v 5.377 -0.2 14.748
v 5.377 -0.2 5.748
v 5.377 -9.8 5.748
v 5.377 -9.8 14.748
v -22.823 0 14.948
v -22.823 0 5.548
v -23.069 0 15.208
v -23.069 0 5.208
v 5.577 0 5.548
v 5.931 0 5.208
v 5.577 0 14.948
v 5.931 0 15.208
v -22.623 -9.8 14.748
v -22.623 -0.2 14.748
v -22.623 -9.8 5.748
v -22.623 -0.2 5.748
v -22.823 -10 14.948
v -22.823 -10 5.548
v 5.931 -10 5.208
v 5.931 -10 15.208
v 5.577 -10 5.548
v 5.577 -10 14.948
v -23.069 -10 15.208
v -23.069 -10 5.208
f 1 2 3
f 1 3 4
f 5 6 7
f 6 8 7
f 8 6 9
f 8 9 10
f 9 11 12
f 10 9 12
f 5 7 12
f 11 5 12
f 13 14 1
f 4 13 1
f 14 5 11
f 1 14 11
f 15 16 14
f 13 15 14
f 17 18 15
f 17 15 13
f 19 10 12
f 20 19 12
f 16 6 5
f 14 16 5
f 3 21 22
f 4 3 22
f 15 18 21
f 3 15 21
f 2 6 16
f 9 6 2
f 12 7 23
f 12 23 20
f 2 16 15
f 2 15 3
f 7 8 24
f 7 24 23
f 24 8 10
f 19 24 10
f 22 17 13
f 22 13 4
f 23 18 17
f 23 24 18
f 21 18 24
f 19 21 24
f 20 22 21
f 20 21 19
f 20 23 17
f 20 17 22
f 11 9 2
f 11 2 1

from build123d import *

# Parameters (mm, degrees)
F0_W     = 29
F0_H     = 10
F0_W_2   = 28
F0_H_2   = 9
F1_DEPTH = 10
F2_SIZE  = 0.2


with BuildPart() as f1:
    # F0 (on Front) → F1 (new body)
    with BuildSketch(Plane.XZ):
        with Locations((-8.569464, 10.20826)):
            Rectangle(F0_W, F0_H)
        with Locations((-8.623311, 10.247656)):
            Rectangle(F0_W_2, F0_H_2, mode=Mode.SUBTRACT)
    extrude(amount=F1_DEPTH)

    # F2
    f2_edges = [f1.edges().sort_by_distance(p)[0] for p in [
        (-8.623311, -10, 5.747656),
        (-8.623311, -10, 14.747656),
        (5.376689, -10, 10.247656),
        (-22.623311, -10, 10.247656),
        (-22.623311, 0, 10.247656),
        (-8.623311, 0, 14.747656),
        (-8.623311, 0, 5.747656),
        (5.376689, 0, 10.247656),
    ]]
    chamfer(f2_edges, length=F2_SIZE)


solid = f1.part
